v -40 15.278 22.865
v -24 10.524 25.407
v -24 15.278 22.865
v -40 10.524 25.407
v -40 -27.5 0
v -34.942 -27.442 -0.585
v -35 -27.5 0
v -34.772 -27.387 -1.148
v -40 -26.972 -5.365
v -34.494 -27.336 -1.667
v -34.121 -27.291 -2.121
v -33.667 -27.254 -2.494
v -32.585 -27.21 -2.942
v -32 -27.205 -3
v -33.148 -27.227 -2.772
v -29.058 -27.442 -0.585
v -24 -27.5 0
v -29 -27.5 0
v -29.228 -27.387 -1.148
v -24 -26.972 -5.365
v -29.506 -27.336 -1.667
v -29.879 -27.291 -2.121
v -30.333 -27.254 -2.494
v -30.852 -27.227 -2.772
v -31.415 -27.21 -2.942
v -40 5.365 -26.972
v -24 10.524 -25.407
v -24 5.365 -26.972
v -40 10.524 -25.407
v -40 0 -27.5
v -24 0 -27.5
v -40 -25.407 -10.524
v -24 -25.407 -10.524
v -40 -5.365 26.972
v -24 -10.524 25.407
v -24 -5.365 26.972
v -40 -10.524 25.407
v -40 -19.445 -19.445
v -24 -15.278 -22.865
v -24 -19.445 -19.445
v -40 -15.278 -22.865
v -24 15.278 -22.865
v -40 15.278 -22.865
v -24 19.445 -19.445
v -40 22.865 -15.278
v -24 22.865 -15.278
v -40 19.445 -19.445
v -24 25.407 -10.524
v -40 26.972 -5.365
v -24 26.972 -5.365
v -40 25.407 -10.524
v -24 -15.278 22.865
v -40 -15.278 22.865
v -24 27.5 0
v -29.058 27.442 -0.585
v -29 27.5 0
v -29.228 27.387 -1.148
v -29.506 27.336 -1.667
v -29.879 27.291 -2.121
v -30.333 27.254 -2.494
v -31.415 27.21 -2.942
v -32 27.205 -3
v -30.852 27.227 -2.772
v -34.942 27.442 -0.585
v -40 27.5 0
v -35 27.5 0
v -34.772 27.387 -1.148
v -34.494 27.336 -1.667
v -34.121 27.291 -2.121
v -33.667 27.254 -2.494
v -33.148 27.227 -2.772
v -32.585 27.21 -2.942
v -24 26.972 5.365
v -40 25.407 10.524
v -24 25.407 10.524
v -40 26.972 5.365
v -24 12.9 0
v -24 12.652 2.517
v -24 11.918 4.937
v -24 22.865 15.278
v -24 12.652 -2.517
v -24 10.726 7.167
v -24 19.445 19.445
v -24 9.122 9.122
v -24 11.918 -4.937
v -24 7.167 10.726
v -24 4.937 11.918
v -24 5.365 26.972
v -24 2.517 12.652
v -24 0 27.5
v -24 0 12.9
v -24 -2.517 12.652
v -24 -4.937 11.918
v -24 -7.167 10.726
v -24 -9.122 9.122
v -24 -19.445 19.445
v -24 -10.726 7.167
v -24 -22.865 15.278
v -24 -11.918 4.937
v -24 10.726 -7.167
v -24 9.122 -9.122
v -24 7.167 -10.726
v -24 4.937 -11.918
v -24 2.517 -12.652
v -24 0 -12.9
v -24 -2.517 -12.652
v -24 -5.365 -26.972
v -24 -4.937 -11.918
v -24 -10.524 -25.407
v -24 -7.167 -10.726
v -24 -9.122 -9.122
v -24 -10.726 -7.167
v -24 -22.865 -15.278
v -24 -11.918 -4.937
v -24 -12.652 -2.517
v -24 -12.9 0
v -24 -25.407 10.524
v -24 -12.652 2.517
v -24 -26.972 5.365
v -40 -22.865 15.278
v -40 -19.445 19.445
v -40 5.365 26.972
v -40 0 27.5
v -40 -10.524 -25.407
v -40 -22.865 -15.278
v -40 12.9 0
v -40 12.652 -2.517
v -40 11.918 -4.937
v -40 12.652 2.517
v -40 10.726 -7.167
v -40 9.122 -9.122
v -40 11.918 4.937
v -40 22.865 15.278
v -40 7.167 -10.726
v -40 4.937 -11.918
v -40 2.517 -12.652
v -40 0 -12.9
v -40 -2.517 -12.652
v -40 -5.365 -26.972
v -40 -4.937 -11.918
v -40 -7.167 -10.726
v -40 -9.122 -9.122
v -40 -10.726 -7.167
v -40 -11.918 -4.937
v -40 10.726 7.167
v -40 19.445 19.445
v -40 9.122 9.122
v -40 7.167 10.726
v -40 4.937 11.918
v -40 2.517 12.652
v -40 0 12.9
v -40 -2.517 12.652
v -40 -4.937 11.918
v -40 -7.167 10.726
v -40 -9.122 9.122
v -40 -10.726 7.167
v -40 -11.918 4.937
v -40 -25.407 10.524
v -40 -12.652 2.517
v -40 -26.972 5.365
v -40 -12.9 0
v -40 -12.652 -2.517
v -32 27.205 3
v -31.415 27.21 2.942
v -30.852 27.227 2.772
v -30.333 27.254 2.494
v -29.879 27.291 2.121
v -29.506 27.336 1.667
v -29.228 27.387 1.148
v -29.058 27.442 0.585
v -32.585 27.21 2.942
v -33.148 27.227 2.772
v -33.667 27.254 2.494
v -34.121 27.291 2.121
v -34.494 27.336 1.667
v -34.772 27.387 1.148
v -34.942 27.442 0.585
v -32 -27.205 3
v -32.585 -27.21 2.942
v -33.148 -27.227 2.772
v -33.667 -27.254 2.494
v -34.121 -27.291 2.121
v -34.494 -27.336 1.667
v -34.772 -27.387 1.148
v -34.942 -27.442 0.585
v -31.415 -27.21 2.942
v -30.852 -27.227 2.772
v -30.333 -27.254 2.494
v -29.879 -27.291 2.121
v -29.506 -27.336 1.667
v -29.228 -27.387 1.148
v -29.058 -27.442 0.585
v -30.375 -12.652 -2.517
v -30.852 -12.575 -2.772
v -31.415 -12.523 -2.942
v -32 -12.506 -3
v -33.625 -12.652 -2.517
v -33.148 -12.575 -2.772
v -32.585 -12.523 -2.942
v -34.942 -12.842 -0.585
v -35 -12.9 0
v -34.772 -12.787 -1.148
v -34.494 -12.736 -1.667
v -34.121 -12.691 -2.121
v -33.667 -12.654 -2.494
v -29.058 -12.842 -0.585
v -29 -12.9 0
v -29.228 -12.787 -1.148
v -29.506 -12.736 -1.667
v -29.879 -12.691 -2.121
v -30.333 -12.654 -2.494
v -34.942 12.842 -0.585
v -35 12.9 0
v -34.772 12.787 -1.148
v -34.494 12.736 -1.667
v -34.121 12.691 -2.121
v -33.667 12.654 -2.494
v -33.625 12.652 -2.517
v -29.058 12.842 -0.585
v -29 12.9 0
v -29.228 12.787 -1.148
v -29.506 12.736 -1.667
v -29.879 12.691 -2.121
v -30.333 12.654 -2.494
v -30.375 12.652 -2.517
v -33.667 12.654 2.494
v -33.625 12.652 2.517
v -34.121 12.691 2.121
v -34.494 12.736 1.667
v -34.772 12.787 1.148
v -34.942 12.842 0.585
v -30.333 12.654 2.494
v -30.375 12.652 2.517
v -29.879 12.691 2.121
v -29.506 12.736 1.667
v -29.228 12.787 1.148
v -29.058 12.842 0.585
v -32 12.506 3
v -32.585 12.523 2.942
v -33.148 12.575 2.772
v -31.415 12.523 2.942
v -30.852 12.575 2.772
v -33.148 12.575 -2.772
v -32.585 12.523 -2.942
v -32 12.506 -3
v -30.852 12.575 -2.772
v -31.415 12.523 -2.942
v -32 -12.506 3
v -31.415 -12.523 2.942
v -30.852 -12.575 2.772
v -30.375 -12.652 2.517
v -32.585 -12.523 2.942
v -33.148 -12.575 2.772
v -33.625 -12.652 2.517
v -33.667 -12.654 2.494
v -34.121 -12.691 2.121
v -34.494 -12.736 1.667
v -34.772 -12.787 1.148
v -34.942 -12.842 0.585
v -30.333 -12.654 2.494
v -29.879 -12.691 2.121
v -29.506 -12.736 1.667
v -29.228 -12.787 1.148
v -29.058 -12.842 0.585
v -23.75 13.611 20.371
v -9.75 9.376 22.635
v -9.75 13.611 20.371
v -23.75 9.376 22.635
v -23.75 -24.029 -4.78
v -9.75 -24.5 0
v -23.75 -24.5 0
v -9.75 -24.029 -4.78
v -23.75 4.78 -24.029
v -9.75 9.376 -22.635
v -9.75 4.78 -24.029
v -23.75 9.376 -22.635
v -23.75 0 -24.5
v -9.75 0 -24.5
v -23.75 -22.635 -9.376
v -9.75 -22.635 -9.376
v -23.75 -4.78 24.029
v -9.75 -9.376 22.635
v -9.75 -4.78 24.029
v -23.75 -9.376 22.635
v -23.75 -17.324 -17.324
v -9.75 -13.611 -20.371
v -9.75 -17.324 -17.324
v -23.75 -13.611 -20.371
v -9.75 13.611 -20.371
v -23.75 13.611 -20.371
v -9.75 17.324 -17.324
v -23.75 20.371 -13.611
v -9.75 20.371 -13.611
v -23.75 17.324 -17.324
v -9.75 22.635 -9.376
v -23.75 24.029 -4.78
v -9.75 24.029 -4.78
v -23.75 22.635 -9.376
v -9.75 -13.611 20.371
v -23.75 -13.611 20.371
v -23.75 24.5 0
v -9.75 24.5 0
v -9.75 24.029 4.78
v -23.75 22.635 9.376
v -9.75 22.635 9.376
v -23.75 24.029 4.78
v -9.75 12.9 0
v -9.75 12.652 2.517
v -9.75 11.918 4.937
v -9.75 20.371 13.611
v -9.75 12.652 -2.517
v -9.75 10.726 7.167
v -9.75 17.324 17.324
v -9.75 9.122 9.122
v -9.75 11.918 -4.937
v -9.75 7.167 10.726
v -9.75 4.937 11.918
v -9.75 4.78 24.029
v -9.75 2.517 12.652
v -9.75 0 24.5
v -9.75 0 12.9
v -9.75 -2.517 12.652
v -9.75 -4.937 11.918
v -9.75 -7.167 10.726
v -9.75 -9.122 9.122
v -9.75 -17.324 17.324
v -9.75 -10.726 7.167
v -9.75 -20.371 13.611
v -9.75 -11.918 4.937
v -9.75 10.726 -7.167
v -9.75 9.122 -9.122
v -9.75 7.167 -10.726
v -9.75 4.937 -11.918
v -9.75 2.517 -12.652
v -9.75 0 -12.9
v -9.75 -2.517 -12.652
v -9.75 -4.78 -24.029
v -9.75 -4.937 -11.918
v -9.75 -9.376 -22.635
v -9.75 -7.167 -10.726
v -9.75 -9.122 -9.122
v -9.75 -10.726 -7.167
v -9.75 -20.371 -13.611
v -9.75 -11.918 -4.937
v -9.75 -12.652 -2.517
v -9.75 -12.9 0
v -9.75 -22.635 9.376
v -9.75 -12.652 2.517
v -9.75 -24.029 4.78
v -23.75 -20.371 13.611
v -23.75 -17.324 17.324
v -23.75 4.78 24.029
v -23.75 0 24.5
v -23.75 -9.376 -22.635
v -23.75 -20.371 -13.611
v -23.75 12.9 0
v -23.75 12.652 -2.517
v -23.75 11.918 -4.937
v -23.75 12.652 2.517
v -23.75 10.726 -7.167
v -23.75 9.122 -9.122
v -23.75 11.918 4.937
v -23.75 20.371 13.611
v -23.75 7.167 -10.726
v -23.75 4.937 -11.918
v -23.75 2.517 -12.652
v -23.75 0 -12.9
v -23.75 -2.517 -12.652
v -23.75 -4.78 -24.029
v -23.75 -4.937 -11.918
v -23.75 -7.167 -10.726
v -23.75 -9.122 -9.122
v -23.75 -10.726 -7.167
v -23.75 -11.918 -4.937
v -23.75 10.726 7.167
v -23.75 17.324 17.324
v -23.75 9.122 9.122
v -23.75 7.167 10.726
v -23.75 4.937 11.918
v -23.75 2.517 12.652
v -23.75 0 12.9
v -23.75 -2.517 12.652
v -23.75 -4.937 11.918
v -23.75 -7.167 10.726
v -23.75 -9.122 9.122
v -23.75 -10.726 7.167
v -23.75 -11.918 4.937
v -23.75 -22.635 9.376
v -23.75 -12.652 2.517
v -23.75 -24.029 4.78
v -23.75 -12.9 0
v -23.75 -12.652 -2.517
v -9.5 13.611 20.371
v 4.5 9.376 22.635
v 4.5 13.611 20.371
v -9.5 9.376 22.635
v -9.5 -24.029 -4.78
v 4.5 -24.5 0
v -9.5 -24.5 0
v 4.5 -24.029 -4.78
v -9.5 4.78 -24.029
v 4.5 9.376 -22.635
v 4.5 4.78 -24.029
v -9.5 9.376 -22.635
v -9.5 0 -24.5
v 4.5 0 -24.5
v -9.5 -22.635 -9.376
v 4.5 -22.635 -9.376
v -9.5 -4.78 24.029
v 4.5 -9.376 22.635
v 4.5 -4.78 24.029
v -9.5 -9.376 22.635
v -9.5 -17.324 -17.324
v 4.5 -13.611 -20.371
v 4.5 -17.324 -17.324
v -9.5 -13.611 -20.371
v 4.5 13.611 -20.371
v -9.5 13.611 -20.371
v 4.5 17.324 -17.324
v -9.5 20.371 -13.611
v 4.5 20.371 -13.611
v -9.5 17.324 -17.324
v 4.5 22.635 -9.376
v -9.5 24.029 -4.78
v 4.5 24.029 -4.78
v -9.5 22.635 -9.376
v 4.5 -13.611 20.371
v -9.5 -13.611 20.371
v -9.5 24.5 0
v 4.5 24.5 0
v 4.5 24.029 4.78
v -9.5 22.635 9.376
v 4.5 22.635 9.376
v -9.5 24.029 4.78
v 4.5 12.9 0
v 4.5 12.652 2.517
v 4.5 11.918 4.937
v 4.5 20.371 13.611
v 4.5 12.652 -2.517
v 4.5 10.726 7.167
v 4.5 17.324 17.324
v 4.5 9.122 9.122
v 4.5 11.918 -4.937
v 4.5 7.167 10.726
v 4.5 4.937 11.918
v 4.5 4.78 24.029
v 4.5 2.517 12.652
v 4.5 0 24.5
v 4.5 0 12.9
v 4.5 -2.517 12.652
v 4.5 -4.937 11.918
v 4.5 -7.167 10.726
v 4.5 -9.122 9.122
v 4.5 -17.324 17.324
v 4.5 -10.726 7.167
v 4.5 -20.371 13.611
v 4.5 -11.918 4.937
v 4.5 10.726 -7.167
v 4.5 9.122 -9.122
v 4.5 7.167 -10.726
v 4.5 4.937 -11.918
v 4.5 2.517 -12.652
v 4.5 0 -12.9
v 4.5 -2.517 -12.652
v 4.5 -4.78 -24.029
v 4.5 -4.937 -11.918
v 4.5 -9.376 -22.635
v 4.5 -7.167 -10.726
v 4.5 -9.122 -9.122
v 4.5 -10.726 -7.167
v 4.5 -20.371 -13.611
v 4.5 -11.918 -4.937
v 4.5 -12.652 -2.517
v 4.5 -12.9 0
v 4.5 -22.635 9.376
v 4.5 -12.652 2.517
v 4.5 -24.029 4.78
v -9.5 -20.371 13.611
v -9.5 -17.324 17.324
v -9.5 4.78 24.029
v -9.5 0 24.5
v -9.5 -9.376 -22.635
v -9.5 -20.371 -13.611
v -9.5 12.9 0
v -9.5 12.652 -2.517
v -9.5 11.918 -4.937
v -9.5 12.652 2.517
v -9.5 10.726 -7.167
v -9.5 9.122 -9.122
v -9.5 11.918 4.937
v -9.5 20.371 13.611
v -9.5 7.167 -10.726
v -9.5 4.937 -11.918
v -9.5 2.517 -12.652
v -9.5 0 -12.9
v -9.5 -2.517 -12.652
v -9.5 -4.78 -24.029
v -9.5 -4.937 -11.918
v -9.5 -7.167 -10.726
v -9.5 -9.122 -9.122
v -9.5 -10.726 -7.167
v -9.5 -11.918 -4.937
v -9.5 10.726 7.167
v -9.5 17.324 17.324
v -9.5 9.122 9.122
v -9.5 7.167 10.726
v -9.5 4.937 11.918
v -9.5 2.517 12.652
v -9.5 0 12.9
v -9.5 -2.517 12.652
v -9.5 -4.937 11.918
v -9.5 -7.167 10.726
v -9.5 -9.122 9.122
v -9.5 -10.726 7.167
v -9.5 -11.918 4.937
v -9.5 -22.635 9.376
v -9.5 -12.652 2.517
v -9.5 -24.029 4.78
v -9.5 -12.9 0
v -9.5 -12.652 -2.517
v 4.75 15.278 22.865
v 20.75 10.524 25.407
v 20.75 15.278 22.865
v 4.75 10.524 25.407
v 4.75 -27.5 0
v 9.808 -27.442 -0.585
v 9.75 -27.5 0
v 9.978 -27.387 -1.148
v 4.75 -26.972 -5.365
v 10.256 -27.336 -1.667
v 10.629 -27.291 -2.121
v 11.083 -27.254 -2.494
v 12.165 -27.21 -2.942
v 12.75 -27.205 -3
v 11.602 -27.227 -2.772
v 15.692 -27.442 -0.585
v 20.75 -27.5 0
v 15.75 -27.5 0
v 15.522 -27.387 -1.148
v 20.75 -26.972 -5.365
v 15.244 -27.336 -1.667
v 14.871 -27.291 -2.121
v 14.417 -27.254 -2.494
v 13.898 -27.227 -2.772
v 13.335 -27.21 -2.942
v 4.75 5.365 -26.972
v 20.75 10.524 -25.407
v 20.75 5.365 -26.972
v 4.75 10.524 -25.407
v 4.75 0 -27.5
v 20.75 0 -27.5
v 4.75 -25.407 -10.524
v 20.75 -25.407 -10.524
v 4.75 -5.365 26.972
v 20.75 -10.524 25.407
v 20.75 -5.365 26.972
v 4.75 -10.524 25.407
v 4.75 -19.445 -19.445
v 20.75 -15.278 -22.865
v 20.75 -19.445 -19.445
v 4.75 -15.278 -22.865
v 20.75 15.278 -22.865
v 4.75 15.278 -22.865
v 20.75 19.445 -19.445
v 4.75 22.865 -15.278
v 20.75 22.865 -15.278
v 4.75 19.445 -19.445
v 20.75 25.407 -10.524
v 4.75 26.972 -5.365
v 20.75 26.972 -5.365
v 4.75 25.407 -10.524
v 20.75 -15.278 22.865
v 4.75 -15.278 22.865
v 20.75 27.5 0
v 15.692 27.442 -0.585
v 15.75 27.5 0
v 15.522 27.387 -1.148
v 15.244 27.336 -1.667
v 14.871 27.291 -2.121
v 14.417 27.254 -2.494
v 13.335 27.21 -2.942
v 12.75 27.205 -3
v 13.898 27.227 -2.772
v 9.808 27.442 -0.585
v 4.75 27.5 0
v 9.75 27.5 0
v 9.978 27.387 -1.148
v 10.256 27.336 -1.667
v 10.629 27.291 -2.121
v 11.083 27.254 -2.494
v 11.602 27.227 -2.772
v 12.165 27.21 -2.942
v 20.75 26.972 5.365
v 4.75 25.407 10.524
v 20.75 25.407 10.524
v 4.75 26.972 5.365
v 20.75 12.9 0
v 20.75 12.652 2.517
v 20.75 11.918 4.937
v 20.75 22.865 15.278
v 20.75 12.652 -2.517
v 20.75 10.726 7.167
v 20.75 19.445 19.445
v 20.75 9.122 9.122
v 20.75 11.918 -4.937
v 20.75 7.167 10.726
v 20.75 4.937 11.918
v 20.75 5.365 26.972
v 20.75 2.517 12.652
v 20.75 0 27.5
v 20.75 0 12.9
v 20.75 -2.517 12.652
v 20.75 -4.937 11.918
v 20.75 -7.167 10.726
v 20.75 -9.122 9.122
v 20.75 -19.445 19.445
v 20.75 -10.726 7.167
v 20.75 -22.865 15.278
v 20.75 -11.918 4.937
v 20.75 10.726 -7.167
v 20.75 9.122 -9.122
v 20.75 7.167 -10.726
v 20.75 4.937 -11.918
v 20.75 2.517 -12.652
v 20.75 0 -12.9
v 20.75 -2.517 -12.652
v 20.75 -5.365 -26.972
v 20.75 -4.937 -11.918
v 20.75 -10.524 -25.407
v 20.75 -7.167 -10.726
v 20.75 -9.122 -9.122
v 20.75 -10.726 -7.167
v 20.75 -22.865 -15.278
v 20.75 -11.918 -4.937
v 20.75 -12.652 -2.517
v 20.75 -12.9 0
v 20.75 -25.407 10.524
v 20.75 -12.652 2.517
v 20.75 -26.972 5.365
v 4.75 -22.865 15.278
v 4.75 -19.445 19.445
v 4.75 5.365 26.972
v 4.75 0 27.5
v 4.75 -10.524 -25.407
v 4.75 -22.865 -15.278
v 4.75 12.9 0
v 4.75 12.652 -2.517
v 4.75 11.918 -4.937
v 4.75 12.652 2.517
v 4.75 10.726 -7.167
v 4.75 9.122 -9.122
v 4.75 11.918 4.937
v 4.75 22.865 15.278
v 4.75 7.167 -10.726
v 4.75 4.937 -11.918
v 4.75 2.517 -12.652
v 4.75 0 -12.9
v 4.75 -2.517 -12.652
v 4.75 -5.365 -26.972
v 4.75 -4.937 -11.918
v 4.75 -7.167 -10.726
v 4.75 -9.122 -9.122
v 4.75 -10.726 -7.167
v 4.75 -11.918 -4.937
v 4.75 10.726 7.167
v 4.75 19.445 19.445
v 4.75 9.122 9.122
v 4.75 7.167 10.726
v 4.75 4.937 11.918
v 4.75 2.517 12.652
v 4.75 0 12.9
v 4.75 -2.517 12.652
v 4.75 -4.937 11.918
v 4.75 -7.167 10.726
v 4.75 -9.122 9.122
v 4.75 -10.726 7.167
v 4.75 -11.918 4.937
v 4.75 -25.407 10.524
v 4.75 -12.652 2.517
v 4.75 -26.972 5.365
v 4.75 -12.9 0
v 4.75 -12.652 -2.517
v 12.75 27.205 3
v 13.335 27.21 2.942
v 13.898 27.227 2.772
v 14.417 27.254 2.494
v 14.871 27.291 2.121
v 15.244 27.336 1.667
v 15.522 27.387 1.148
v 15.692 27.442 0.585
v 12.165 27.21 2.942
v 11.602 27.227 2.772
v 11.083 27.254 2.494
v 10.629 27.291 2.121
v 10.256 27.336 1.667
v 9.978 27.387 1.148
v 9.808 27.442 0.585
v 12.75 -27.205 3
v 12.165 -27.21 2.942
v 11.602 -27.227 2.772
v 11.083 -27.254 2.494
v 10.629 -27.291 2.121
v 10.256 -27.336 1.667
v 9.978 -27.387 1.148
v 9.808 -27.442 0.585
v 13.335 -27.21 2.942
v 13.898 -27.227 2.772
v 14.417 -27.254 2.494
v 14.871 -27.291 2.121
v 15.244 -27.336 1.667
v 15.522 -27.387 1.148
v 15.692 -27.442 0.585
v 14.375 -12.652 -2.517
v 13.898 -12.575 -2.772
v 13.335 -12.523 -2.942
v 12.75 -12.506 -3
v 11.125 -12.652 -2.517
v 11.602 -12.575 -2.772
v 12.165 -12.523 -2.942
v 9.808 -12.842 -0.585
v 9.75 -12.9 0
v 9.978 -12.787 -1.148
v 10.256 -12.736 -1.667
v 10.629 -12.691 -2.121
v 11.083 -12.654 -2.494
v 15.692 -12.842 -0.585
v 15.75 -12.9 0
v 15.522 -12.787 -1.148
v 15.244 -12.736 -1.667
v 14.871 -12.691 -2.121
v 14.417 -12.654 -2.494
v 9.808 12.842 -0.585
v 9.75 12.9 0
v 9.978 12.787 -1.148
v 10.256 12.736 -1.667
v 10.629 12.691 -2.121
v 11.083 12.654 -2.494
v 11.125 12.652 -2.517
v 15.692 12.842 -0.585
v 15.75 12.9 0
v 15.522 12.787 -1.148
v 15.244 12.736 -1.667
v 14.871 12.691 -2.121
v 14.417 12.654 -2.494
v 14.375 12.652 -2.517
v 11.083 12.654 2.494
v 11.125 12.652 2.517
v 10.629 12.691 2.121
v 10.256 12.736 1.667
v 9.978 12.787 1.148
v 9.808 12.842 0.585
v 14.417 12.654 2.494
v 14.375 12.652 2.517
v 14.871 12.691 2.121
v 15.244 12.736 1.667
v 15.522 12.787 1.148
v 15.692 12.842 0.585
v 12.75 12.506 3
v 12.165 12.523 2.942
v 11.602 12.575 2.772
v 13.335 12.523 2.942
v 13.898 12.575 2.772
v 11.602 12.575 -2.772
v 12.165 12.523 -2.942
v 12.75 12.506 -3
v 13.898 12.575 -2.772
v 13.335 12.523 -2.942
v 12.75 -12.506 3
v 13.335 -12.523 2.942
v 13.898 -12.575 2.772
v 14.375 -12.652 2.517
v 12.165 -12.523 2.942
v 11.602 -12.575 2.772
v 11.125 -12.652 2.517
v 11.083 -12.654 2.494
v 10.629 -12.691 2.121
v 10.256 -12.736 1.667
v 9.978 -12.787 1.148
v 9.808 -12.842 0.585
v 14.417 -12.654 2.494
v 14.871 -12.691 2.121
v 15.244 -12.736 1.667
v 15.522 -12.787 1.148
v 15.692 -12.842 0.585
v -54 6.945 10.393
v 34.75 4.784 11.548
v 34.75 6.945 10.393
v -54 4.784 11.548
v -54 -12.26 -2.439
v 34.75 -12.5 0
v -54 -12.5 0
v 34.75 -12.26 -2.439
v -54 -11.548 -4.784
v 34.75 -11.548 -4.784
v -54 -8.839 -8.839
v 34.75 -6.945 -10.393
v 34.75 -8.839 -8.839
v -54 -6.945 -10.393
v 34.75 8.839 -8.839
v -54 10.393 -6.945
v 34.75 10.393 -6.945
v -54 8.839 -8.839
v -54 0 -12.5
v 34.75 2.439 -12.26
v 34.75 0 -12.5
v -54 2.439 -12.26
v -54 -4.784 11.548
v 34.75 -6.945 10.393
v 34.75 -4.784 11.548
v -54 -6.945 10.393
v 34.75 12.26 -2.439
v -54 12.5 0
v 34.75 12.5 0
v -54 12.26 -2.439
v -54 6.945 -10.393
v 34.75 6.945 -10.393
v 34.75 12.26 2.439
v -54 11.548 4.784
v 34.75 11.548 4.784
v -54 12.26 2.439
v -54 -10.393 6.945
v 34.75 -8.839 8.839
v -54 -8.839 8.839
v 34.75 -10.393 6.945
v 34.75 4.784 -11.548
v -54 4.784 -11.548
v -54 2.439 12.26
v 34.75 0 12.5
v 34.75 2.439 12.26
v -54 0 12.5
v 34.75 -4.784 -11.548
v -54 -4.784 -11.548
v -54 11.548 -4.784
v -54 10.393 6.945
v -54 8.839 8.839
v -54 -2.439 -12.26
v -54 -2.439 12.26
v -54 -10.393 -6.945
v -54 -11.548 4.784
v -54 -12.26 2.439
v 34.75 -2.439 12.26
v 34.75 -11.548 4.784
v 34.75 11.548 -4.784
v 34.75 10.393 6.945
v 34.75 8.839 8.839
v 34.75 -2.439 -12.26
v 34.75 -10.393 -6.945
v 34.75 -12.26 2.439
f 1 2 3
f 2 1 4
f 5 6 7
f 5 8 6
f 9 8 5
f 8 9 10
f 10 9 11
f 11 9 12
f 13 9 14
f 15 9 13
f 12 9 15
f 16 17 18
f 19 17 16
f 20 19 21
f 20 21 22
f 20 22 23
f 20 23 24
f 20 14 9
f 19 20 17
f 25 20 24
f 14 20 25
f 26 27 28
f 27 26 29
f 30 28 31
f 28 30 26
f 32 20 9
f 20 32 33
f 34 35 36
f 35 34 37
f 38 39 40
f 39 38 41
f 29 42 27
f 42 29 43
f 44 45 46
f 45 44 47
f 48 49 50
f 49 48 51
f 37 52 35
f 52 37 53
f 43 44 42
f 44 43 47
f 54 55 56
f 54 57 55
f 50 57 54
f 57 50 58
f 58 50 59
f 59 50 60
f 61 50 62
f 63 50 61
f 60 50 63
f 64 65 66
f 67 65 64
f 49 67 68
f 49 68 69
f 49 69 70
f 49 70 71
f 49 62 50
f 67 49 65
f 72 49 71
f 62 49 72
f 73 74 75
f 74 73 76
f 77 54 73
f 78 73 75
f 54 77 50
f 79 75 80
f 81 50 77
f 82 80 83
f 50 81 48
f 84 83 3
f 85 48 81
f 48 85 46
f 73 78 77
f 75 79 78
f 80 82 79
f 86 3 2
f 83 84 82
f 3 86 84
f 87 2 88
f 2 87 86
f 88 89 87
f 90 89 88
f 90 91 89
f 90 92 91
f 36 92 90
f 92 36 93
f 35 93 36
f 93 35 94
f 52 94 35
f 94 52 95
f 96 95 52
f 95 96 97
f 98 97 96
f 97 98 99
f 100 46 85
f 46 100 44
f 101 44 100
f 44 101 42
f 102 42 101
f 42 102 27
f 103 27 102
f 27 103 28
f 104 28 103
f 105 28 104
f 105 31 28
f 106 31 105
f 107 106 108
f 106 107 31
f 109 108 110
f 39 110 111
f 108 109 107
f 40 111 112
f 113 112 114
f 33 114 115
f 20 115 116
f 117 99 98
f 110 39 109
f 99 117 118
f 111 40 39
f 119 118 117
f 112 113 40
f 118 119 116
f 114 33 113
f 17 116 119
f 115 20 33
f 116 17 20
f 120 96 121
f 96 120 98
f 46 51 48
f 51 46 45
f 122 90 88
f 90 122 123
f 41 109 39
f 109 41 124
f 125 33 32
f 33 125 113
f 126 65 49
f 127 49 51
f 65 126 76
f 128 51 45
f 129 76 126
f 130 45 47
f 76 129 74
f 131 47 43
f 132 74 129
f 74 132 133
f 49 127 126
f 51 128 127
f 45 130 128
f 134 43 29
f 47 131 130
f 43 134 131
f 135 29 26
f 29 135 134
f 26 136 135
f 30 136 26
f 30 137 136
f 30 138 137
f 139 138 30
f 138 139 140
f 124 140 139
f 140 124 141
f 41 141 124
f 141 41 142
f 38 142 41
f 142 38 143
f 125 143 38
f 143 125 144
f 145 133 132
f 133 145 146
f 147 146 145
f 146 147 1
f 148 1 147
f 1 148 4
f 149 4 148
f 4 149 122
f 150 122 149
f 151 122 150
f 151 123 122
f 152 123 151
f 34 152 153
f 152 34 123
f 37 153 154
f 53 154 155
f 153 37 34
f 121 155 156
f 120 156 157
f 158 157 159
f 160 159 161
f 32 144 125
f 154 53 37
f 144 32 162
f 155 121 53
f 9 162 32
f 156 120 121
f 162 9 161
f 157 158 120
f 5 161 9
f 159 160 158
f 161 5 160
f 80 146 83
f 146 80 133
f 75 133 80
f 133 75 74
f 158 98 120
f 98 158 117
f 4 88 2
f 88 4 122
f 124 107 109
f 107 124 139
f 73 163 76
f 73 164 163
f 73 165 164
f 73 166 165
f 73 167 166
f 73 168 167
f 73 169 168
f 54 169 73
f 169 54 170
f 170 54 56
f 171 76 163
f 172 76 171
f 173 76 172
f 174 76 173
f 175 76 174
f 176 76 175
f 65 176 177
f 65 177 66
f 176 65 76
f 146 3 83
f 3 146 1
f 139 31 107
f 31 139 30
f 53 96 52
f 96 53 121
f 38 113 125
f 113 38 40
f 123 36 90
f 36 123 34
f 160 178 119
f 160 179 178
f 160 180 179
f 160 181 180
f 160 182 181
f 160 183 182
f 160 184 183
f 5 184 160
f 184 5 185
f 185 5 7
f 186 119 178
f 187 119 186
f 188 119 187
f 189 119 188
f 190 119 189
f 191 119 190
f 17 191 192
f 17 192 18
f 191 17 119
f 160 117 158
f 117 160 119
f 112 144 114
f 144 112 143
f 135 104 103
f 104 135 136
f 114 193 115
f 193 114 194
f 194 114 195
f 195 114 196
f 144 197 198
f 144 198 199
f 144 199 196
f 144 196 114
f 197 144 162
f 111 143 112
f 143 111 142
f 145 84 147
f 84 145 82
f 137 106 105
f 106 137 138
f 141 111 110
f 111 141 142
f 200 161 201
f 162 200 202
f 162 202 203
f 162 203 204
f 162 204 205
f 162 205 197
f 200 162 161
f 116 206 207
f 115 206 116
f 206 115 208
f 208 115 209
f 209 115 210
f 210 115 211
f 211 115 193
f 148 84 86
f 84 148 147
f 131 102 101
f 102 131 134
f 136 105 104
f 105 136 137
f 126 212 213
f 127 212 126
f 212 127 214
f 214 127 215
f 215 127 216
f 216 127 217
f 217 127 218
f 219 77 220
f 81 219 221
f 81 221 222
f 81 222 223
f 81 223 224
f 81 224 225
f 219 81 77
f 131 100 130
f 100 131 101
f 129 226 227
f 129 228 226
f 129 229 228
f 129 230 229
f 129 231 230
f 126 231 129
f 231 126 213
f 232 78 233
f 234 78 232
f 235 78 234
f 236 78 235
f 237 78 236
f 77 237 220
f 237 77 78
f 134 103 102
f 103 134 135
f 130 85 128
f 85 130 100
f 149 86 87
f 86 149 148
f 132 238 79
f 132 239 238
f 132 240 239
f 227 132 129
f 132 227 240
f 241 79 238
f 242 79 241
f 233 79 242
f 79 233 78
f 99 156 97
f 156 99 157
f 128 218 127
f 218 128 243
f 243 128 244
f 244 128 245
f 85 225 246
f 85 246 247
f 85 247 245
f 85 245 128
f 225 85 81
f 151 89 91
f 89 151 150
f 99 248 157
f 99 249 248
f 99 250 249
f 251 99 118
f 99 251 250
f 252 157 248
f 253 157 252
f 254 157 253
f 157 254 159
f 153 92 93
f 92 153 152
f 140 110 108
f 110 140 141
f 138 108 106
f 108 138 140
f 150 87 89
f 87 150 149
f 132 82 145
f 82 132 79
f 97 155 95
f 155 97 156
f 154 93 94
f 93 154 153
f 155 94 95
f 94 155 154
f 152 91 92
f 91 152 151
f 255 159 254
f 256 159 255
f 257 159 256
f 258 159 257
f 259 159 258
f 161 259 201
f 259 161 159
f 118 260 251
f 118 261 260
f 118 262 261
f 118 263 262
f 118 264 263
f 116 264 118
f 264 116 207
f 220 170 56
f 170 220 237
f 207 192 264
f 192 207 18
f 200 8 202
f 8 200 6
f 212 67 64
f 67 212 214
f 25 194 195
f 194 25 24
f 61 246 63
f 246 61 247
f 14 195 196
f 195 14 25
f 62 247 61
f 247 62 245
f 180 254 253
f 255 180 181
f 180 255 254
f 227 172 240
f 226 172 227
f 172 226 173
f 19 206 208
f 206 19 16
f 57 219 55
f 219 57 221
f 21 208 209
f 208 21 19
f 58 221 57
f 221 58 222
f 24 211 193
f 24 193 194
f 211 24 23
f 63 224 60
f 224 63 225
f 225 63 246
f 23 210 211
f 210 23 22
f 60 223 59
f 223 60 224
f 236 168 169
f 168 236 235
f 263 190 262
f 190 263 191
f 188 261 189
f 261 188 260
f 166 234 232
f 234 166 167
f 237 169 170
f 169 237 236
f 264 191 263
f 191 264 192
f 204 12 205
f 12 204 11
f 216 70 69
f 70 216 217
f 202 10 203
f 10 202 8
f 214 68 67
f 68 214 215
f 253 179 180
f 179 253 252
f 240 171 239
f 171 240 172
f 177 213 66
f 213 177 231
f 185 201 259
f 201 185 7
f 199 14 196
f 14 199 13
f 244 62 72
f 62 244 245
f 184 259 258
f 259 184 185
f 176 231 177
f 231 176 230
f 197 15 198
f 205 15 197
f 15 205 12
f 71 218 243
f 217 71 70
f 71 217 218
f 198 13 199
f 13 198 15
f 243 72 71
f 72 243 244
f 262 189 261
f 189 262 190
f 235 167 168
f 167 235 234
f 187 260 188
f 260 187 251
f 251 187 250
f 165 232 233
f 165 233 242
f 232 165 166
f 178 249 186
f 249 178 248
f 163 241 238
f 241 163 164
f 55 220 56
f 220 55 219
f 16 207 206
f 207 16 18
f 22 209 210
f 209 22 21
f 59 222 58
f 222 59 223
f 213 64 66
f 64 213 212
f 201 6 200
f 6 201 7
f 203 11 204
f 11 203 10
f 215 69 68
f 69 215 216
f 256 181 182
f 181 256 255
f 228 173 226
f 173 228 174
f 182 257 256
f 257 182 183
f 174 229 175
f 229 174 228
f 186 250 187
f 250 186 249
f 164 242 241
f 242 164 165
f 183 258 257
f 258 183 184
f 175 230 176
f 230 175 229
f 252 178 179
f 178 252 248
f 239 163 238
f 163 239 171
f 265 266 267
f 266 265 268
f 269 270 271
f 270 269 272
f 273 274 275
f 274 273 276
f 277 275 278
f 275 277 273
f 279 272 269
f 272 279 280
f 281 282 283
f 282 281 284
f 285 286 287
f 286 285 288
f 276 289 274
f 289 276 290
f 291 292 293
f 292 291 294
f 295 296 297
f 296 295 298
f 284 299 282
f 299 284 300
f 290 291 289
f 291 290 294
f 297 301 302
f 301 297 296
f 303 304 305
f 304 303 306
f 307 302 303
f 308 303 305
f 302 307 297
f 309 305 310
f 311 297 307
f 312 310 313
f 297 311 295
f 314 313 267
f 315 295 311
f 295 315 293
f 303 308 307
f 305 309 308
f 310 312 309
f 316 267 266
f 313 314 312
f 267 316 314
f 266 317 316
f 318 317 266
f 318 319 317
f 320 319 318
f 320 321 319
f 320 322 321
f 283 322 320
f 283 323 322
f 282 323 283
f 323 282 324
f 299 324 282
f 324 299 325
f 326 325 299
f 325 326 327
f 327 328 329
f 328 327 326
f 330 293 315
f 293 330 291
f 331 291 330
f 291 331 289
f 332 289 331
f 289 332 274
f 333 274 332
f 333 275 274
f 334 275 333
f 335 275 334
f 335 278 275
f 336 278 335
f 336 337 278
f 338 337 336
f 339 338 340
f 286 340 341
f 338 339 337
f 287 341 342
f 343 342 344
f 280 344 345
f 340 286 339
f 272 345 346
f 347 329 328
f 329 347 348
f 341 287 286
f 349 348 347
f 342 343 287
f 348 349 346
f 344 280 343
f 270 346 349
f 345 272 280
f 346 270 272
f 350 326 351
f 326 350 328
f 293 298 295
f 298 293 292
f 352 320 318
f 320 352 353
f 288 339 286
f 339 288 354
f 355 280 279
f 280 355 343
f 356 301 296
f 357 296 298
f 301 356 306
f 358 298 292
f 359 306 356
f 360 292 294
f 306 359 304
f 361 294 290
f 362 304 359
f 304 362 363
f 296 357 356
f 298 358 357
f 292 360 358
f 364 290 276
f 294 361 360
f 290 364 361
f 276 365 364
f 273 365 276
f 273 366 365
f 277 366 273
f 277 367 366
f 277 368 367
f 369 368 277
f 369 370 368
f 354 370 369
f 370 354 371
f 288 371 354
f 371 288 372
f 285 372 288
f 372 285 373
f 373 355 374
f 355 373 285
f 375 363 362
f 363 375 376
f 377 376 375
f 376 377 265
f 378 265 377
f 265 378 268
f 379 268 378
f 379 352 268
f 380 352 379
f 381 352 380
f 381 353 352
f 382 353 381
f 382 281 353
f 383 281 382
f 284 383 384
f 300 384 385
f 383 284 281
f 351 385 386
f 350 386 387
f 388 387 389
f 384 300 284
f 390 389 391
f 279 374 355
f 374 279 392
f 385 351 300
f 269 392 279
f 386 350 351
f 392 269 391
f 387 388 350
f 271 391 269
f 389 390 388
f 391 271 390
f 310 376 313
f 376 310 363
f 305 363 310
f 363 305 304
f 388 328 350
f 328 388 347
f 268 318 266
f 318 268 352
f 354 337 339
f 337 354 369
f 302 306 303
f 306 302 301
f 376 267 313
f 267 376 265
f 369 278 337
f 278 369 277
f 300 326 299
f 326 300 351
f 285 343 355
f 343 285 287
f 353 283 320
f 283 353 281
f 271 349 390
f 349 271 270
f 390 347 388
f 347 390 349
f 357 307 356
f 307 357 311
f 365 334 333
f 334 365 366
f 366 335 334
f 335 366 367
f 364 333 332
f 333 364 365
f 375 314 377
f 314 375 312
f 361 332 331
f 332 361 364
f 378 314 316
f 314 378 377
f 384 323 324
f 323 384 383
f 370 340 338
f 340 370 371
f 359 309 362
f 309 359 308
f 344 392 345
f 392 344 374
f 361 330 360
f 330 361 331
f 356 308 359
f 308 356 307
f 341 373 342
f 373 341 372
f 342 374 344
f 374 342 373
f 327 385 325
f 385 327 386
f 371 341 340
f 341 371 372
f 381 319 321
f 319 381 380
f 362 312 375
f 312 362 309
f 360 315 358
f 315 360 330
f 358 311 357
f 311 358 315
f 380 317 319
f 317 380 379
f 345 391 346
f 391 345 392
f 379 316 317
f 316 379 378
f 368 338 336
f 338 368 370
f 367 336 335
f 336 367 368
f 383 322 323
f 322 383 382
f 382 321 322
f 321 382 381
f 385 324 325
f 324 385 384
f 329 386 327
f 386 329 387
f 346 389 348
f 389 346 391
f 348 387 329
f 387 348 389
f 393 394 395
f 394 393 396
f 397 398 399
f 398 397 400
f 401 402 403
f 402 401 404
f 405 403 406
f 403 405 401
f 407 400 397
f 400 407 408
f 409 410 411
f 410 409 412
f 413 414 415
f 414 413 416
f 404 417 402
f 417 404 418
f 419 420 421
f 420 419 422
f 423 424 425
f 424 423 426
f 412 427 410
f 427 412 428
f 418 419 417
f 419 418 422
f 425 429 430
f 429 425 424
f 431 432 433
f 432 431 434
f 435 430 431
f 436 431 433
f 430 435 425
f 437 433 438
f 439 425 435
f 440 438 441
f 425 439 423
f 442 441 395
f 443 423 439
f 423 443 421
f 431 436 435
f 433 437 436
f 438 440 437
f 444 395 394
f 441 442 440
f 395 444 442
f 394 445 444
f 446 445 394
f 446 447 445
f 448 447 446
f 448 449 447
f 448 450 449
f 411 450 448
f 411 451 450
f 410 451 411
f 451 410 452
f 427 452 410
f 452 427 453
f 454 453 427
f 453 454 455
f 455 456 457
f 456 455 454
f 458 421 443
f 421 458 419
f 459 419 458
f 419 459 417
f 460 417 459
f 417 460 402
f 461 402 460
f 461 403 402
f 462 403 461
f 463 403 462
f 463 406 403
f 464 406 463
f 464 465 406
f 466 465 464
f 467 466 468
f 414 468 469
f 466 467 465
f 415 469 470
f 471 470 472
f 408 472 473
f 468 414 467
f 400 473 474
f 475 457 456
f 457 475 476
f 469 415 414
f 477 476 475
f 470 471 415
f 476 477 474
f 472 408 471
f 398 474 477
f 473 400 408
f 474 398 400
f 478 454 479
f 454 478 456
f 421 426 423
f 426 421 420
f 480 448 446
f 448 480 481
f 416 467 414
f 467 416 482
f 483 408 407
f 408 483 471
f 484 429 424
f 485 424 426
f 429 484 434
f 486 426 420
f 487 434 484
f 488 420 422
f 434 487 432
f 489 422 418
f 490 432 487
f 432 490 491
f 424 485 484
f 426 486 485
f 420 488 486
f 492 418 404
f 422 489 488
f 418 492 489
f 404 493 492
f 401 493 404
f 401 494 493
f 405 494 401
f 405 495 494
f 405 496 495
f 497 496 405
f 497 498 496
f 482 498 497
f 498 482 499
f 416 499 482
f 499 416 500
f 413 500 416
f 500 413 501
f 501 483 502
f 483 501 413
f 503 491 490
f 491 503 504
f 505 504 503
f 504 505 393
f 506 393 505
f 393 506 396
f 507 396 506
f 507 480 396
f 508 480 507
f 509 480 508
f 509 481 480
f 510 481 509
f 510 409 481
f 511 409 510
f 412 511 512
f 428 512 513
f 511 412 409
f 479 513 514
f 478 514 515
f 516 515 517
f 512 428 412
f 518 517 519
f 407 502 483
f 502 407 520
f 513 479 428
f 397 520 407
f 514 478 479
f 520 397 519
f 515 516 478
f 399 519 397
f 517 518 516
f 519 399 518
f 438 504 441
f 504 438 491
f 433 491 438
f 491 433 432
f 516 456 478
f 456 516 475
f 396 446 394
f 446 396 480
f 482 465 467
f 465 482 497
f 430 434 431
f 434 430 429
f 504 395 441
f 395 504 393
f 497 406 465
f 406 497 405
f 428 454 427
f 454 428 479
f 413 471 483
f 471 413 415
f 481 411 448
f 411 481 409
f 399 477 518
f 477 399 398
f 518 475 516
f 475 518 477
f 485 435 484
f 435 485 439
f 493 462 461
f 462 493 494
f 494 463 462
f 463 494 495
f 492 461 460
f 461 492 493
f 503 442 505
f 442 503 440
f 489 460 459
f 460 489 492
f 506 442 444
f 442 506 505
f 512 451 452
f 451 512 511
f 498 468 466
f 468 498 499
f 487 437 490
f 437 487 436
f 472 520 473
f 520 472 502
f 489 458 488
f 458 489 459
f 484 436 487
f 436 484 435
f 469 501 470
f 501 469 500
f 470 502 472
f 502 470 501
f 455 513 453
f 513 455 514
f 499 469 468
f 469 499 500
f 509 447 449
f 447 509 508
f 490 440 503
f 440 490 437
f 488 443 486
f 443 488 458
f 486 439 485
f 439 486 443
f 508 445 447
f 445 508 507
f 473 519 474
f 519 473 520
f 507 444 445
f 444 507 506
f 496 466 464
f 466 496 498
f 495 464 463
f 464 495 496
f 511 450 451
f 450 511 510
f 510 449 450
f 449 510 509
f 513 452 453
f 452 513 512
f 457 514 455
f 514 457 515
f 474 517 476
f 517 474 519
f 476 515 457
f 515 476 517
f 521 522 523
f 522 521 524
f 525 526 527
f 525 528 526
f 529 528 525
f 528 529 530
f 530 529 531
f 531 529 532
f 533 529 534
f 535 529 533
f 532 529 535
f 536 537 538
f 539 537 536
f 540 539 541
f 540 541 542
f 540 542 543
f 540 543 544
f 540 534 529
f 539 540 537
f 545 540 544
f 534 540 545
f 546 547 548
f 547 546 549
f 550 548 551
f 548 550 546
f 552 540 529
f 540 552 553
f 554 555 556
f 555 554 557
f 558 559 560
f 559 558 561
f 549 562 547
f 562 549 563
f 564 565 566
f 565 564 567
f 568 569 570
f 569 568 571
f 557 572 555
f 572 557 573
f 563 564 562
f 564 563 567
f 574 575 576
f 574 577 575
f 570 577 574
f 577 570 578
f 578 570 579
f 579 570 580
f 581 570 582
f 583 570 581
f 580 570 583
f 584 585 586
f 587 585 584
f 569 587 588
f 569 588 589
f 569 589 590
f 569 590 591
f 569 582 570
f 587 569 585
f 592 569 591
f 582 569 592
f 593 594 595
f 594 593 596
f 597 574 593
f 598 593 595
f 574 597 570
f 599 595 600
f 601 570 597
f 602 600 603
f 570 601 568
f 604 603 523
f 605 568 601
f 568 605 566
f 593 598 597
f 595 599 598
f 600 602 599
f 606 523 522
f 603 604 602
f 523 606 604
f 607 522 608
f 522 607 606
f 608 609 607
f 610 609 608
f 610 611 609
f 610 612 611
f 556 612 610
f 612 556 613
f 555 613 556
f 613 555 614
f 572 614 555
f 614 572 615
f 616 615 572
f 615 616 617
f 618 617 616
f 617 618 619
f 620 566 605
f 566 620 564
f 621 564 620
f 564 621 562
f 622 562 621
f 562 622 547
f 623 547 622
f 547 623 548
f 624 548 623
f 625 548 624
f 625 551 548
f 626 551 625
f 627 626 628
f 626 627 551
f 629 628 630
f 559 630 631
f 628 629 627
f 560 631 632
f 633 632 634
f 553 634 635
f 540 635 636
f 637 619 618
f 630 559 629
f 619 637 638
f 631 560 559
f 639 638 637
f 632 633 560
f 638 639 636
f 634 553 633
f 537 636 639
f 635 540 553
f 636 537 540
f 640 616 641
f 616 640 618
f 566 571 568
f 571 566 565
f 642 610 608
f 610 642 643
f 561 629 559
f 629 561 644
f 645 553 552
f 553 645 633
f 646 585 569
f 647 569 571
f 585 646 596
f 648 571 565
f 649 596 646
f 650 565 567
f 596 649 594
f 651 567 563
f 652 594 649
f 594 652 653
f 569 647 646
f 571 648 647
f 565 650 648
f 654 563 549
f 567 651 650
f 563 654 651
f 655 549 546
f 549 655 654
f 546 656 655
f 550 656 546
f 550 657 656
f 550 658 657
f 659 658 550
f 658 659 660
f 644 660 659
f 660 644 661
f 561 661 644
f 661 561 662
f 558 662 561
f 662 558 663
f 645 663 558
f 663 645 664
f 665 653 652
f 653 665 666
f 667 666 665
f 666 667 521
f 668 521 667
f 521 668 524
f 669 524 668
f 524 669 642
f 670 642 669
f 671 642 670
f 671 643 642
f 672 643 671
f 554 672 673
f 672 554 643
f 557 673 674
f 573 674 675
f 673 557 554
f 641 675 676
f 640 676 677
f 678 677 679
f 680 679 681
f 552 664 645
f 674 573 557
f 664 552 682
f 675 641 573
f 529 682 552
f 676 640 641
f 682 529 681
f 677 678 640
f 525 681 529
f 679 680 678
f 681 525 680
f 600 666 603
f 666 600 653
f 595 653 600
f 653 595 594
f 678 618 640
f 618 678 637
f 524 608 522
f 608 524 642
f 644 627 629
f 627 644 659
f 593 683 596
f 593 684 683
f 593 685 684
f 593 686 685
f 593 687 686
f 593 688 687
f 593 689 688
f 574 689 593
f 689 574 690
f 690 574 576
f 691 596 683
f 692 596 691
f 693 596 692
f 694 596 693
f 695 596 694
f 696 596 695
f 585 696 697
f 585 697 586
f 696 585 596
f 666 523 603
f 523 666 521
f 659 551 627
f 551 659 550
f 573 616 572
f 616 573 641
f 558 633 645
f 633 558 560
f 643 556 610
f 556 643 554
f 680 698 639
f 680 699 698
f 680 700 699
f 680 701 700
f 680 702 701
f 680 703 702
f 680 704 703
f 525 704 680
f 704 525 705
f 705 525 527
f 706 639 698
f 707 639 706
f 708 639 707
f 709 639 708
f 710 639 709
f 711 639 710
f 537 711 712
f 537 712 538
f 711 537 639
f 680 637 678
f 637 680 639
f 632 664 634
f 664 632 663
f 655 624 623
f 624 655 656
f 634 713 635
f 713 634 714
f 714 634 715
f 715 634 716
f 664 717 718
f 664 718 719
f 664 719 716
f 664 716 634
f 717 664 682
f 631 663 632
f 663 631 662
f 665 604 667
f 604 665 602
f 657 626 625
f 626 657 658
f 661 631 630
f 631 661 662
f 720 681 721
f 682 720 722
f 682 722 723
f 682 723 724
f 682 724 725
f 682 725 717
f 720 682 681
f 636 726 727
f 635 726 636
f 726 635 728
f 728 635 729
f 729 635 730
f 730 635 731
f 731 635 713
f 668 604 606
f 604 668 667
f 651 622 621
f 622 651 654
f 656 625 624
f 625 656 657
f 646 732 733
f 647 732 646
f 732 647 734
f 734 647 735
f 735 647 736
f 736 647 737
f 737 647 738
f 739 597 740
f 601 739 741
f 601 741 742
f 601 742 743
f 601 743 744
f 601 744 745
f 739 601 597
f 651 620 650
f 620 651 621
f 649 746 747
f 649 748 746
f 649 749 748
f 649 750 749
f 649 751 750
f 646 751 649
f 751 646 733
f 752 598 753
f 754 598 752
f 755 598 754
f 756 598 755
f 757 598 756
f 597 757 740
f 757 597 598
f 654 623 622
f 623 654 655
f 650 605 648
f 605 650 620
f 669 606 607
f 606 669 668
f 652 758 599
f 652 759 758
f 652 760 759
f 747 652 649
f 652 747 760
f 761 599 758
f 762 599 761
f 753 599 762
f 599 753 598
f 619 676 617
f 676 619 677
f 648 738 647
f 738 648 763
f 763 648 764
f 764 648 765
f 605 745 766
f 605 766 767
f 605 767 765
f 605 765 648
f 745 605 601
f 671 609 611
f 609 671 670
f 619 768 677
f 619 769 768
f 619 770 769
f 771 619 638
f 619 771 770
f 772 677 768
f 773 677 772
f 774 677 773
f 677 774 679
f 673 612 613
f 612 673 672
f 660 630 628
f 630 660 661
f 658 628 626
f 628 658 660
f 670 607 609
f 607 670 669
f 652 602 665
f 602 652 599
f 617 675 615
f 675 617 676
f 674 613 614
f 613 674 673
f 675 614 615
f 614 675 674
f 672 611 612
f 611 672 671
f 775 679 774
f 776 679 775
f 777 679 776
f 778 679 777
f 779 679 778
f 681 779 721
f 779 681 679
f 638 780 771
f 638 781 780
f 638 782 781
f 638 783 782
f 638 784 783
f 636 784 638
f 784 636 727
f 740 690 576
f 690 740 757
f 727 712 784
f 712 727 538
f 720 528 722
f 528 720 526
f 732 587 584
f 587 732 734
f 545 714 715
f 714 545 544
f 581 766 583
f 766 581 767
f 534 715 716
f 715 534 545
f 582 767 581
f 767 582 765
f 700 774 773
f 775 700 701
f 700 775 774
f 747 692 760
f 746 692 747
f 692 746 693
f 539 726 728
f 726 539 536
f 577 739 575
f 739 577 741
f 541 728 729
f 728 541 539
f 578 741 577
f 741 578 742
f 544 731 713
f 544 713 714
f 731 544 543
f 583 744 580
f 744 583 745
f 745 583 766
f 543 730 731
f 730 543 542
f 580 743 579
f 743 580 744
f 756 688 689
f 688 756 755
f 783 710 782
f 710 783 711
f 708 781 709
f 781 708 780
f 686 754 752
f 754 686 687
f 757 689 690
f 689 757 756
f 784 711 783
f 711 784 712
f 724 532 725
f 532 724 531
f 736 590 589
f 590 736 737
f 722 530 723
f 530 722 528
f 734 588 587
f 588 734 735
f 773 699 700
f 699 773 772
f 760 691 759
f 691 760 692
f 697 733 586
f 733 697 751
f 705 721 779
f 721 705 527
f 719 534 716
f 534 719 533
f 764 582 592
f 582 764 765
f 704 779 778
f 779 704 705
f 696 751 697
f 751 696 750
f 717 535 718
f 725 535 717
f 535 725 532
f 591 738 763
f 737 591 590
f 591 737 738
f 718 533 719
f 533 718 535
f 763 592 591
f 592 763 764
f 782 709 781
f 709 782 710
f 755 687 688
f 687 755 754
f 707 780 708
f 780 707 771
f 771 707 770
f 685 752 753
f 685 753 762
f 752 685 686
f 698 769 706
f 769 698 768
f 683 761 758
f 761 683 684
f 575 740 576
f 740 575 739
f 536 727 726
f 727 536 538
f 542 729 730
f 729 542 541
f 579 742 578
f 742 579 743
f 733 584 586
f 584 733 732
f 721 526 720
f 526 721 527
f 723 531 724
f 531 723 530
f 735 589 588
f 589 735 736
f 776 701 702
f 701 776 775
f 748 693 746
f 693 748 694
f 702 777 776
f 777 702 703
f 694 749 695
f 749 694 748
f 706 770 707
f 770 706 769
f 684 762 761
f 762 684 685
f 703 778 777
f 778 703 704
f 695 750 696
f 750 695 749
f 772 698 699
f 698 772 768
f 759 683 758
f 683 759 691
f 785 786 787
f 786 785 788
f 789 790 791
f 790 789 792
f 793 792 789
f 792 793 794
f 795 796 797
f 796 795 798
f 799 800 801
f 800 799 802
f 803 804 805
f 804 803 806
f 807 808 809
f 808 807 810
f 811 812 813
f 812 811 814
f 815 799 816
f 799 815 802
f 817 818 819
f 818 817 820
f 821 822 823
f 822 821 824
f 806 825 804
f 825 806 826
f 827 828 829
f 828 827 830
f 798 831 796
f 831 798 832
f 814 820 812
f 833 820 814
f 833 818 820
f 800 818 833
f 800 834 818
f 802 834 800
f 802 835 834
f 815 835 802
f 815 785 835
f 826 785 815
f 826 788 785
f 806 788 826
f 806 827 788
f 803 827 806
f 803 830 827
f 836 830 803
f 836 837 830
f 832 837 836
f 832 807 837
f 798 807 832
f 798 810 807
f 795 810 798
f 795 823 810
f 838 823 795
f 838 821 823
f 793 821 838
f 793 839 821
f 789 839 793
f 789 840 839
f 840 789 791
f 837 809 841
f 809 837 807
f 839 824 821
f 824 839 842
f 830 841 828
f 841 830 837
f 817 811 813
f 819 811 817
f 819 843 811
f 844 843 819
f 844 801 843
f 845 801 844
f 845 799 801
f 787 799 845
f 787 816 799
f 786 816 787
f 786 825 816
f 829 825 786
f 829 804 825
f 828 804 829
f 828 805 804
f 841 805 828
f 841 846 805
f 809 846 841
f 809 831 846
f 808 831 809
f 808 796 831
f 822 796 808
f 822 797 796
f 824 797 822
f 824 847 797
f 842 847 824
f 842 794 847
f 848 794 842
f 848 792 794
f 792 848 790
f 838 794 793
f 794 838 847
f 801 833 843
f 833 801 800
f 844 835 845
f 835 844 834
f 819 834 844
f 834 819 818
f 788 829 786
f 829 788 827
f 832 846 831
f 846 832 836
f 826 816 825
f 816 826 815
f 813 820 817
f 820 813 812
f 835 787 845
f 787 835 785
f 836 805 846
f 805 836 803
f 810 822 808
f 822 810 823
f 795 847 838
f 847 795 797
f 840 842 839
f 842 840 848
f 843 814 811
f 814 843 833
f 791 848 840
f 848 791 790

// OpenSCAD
$fn = 32;

// ------------------------------------------------------------------------
// Shaft with rings and collars: d25 shaft, 4 rings
// Every part is its own module, assembly() places them once.
// ------------------------------------------------------------------------

// --- part 1 ---
module shaft() {
  translate([0, 0, -44.375]) cylinder(h = 88.75, d = 25);
}

// --- part 2 ---
module collar_a() {
  difference() {
    cylinder(h = 16, d = 55);
    translate([0, 0, -1]) cylinder(h = 18, d = 25.8);
    translate([0, 0, 8]) rotate([90, 0, 0]) cylinder(h = 57, d = 6, center = true);
  }
}

// --- part 3 ---
module spacer_a() {
  difference() {
      translate([0, 0, 0]) cylinder(h = 14, d = 49);
      translate([0, 0, -1]) cylinder(h = 16, d = 25.8);
    }
}

// --- part 4 ---
module spacer_b() {
  difference() {
      translate([0, 0, 0]) cylinder(h = 14, d = 49);
      translate([0, 0, -1]) cylinder(h = 16, d = 25.8);
    }
}

// --- part 5 ---
module collar_b() {
  difference() {
    cylinder(h = 16, d = 55);
    translate([0, 0, -1]) cylinder(h = 18, d = 25.8);
    translate([0, 0, 8]) rotate([90, 0, 0]) cylinder(h = 57, d = 6, center = true);
  }
}

// --- assembly ---
module assembly() {
  translate([-9.625, 0, 0]) rotate([0, 90, 0]) shaft();
  translate([-40, 0, 0]) rotate([0, 90, 0]) collar_a();
  translate([-23.75, 0, 0]) rotate([0, 90, 0]) spacer_a();
  translate([-9.5, 0, 0]) rotate([0, 90, 0]) spacer_b();
  translate([4.75, 0, 0]) rotate([0, 90, 0]) collar_b();
}

assembly();
